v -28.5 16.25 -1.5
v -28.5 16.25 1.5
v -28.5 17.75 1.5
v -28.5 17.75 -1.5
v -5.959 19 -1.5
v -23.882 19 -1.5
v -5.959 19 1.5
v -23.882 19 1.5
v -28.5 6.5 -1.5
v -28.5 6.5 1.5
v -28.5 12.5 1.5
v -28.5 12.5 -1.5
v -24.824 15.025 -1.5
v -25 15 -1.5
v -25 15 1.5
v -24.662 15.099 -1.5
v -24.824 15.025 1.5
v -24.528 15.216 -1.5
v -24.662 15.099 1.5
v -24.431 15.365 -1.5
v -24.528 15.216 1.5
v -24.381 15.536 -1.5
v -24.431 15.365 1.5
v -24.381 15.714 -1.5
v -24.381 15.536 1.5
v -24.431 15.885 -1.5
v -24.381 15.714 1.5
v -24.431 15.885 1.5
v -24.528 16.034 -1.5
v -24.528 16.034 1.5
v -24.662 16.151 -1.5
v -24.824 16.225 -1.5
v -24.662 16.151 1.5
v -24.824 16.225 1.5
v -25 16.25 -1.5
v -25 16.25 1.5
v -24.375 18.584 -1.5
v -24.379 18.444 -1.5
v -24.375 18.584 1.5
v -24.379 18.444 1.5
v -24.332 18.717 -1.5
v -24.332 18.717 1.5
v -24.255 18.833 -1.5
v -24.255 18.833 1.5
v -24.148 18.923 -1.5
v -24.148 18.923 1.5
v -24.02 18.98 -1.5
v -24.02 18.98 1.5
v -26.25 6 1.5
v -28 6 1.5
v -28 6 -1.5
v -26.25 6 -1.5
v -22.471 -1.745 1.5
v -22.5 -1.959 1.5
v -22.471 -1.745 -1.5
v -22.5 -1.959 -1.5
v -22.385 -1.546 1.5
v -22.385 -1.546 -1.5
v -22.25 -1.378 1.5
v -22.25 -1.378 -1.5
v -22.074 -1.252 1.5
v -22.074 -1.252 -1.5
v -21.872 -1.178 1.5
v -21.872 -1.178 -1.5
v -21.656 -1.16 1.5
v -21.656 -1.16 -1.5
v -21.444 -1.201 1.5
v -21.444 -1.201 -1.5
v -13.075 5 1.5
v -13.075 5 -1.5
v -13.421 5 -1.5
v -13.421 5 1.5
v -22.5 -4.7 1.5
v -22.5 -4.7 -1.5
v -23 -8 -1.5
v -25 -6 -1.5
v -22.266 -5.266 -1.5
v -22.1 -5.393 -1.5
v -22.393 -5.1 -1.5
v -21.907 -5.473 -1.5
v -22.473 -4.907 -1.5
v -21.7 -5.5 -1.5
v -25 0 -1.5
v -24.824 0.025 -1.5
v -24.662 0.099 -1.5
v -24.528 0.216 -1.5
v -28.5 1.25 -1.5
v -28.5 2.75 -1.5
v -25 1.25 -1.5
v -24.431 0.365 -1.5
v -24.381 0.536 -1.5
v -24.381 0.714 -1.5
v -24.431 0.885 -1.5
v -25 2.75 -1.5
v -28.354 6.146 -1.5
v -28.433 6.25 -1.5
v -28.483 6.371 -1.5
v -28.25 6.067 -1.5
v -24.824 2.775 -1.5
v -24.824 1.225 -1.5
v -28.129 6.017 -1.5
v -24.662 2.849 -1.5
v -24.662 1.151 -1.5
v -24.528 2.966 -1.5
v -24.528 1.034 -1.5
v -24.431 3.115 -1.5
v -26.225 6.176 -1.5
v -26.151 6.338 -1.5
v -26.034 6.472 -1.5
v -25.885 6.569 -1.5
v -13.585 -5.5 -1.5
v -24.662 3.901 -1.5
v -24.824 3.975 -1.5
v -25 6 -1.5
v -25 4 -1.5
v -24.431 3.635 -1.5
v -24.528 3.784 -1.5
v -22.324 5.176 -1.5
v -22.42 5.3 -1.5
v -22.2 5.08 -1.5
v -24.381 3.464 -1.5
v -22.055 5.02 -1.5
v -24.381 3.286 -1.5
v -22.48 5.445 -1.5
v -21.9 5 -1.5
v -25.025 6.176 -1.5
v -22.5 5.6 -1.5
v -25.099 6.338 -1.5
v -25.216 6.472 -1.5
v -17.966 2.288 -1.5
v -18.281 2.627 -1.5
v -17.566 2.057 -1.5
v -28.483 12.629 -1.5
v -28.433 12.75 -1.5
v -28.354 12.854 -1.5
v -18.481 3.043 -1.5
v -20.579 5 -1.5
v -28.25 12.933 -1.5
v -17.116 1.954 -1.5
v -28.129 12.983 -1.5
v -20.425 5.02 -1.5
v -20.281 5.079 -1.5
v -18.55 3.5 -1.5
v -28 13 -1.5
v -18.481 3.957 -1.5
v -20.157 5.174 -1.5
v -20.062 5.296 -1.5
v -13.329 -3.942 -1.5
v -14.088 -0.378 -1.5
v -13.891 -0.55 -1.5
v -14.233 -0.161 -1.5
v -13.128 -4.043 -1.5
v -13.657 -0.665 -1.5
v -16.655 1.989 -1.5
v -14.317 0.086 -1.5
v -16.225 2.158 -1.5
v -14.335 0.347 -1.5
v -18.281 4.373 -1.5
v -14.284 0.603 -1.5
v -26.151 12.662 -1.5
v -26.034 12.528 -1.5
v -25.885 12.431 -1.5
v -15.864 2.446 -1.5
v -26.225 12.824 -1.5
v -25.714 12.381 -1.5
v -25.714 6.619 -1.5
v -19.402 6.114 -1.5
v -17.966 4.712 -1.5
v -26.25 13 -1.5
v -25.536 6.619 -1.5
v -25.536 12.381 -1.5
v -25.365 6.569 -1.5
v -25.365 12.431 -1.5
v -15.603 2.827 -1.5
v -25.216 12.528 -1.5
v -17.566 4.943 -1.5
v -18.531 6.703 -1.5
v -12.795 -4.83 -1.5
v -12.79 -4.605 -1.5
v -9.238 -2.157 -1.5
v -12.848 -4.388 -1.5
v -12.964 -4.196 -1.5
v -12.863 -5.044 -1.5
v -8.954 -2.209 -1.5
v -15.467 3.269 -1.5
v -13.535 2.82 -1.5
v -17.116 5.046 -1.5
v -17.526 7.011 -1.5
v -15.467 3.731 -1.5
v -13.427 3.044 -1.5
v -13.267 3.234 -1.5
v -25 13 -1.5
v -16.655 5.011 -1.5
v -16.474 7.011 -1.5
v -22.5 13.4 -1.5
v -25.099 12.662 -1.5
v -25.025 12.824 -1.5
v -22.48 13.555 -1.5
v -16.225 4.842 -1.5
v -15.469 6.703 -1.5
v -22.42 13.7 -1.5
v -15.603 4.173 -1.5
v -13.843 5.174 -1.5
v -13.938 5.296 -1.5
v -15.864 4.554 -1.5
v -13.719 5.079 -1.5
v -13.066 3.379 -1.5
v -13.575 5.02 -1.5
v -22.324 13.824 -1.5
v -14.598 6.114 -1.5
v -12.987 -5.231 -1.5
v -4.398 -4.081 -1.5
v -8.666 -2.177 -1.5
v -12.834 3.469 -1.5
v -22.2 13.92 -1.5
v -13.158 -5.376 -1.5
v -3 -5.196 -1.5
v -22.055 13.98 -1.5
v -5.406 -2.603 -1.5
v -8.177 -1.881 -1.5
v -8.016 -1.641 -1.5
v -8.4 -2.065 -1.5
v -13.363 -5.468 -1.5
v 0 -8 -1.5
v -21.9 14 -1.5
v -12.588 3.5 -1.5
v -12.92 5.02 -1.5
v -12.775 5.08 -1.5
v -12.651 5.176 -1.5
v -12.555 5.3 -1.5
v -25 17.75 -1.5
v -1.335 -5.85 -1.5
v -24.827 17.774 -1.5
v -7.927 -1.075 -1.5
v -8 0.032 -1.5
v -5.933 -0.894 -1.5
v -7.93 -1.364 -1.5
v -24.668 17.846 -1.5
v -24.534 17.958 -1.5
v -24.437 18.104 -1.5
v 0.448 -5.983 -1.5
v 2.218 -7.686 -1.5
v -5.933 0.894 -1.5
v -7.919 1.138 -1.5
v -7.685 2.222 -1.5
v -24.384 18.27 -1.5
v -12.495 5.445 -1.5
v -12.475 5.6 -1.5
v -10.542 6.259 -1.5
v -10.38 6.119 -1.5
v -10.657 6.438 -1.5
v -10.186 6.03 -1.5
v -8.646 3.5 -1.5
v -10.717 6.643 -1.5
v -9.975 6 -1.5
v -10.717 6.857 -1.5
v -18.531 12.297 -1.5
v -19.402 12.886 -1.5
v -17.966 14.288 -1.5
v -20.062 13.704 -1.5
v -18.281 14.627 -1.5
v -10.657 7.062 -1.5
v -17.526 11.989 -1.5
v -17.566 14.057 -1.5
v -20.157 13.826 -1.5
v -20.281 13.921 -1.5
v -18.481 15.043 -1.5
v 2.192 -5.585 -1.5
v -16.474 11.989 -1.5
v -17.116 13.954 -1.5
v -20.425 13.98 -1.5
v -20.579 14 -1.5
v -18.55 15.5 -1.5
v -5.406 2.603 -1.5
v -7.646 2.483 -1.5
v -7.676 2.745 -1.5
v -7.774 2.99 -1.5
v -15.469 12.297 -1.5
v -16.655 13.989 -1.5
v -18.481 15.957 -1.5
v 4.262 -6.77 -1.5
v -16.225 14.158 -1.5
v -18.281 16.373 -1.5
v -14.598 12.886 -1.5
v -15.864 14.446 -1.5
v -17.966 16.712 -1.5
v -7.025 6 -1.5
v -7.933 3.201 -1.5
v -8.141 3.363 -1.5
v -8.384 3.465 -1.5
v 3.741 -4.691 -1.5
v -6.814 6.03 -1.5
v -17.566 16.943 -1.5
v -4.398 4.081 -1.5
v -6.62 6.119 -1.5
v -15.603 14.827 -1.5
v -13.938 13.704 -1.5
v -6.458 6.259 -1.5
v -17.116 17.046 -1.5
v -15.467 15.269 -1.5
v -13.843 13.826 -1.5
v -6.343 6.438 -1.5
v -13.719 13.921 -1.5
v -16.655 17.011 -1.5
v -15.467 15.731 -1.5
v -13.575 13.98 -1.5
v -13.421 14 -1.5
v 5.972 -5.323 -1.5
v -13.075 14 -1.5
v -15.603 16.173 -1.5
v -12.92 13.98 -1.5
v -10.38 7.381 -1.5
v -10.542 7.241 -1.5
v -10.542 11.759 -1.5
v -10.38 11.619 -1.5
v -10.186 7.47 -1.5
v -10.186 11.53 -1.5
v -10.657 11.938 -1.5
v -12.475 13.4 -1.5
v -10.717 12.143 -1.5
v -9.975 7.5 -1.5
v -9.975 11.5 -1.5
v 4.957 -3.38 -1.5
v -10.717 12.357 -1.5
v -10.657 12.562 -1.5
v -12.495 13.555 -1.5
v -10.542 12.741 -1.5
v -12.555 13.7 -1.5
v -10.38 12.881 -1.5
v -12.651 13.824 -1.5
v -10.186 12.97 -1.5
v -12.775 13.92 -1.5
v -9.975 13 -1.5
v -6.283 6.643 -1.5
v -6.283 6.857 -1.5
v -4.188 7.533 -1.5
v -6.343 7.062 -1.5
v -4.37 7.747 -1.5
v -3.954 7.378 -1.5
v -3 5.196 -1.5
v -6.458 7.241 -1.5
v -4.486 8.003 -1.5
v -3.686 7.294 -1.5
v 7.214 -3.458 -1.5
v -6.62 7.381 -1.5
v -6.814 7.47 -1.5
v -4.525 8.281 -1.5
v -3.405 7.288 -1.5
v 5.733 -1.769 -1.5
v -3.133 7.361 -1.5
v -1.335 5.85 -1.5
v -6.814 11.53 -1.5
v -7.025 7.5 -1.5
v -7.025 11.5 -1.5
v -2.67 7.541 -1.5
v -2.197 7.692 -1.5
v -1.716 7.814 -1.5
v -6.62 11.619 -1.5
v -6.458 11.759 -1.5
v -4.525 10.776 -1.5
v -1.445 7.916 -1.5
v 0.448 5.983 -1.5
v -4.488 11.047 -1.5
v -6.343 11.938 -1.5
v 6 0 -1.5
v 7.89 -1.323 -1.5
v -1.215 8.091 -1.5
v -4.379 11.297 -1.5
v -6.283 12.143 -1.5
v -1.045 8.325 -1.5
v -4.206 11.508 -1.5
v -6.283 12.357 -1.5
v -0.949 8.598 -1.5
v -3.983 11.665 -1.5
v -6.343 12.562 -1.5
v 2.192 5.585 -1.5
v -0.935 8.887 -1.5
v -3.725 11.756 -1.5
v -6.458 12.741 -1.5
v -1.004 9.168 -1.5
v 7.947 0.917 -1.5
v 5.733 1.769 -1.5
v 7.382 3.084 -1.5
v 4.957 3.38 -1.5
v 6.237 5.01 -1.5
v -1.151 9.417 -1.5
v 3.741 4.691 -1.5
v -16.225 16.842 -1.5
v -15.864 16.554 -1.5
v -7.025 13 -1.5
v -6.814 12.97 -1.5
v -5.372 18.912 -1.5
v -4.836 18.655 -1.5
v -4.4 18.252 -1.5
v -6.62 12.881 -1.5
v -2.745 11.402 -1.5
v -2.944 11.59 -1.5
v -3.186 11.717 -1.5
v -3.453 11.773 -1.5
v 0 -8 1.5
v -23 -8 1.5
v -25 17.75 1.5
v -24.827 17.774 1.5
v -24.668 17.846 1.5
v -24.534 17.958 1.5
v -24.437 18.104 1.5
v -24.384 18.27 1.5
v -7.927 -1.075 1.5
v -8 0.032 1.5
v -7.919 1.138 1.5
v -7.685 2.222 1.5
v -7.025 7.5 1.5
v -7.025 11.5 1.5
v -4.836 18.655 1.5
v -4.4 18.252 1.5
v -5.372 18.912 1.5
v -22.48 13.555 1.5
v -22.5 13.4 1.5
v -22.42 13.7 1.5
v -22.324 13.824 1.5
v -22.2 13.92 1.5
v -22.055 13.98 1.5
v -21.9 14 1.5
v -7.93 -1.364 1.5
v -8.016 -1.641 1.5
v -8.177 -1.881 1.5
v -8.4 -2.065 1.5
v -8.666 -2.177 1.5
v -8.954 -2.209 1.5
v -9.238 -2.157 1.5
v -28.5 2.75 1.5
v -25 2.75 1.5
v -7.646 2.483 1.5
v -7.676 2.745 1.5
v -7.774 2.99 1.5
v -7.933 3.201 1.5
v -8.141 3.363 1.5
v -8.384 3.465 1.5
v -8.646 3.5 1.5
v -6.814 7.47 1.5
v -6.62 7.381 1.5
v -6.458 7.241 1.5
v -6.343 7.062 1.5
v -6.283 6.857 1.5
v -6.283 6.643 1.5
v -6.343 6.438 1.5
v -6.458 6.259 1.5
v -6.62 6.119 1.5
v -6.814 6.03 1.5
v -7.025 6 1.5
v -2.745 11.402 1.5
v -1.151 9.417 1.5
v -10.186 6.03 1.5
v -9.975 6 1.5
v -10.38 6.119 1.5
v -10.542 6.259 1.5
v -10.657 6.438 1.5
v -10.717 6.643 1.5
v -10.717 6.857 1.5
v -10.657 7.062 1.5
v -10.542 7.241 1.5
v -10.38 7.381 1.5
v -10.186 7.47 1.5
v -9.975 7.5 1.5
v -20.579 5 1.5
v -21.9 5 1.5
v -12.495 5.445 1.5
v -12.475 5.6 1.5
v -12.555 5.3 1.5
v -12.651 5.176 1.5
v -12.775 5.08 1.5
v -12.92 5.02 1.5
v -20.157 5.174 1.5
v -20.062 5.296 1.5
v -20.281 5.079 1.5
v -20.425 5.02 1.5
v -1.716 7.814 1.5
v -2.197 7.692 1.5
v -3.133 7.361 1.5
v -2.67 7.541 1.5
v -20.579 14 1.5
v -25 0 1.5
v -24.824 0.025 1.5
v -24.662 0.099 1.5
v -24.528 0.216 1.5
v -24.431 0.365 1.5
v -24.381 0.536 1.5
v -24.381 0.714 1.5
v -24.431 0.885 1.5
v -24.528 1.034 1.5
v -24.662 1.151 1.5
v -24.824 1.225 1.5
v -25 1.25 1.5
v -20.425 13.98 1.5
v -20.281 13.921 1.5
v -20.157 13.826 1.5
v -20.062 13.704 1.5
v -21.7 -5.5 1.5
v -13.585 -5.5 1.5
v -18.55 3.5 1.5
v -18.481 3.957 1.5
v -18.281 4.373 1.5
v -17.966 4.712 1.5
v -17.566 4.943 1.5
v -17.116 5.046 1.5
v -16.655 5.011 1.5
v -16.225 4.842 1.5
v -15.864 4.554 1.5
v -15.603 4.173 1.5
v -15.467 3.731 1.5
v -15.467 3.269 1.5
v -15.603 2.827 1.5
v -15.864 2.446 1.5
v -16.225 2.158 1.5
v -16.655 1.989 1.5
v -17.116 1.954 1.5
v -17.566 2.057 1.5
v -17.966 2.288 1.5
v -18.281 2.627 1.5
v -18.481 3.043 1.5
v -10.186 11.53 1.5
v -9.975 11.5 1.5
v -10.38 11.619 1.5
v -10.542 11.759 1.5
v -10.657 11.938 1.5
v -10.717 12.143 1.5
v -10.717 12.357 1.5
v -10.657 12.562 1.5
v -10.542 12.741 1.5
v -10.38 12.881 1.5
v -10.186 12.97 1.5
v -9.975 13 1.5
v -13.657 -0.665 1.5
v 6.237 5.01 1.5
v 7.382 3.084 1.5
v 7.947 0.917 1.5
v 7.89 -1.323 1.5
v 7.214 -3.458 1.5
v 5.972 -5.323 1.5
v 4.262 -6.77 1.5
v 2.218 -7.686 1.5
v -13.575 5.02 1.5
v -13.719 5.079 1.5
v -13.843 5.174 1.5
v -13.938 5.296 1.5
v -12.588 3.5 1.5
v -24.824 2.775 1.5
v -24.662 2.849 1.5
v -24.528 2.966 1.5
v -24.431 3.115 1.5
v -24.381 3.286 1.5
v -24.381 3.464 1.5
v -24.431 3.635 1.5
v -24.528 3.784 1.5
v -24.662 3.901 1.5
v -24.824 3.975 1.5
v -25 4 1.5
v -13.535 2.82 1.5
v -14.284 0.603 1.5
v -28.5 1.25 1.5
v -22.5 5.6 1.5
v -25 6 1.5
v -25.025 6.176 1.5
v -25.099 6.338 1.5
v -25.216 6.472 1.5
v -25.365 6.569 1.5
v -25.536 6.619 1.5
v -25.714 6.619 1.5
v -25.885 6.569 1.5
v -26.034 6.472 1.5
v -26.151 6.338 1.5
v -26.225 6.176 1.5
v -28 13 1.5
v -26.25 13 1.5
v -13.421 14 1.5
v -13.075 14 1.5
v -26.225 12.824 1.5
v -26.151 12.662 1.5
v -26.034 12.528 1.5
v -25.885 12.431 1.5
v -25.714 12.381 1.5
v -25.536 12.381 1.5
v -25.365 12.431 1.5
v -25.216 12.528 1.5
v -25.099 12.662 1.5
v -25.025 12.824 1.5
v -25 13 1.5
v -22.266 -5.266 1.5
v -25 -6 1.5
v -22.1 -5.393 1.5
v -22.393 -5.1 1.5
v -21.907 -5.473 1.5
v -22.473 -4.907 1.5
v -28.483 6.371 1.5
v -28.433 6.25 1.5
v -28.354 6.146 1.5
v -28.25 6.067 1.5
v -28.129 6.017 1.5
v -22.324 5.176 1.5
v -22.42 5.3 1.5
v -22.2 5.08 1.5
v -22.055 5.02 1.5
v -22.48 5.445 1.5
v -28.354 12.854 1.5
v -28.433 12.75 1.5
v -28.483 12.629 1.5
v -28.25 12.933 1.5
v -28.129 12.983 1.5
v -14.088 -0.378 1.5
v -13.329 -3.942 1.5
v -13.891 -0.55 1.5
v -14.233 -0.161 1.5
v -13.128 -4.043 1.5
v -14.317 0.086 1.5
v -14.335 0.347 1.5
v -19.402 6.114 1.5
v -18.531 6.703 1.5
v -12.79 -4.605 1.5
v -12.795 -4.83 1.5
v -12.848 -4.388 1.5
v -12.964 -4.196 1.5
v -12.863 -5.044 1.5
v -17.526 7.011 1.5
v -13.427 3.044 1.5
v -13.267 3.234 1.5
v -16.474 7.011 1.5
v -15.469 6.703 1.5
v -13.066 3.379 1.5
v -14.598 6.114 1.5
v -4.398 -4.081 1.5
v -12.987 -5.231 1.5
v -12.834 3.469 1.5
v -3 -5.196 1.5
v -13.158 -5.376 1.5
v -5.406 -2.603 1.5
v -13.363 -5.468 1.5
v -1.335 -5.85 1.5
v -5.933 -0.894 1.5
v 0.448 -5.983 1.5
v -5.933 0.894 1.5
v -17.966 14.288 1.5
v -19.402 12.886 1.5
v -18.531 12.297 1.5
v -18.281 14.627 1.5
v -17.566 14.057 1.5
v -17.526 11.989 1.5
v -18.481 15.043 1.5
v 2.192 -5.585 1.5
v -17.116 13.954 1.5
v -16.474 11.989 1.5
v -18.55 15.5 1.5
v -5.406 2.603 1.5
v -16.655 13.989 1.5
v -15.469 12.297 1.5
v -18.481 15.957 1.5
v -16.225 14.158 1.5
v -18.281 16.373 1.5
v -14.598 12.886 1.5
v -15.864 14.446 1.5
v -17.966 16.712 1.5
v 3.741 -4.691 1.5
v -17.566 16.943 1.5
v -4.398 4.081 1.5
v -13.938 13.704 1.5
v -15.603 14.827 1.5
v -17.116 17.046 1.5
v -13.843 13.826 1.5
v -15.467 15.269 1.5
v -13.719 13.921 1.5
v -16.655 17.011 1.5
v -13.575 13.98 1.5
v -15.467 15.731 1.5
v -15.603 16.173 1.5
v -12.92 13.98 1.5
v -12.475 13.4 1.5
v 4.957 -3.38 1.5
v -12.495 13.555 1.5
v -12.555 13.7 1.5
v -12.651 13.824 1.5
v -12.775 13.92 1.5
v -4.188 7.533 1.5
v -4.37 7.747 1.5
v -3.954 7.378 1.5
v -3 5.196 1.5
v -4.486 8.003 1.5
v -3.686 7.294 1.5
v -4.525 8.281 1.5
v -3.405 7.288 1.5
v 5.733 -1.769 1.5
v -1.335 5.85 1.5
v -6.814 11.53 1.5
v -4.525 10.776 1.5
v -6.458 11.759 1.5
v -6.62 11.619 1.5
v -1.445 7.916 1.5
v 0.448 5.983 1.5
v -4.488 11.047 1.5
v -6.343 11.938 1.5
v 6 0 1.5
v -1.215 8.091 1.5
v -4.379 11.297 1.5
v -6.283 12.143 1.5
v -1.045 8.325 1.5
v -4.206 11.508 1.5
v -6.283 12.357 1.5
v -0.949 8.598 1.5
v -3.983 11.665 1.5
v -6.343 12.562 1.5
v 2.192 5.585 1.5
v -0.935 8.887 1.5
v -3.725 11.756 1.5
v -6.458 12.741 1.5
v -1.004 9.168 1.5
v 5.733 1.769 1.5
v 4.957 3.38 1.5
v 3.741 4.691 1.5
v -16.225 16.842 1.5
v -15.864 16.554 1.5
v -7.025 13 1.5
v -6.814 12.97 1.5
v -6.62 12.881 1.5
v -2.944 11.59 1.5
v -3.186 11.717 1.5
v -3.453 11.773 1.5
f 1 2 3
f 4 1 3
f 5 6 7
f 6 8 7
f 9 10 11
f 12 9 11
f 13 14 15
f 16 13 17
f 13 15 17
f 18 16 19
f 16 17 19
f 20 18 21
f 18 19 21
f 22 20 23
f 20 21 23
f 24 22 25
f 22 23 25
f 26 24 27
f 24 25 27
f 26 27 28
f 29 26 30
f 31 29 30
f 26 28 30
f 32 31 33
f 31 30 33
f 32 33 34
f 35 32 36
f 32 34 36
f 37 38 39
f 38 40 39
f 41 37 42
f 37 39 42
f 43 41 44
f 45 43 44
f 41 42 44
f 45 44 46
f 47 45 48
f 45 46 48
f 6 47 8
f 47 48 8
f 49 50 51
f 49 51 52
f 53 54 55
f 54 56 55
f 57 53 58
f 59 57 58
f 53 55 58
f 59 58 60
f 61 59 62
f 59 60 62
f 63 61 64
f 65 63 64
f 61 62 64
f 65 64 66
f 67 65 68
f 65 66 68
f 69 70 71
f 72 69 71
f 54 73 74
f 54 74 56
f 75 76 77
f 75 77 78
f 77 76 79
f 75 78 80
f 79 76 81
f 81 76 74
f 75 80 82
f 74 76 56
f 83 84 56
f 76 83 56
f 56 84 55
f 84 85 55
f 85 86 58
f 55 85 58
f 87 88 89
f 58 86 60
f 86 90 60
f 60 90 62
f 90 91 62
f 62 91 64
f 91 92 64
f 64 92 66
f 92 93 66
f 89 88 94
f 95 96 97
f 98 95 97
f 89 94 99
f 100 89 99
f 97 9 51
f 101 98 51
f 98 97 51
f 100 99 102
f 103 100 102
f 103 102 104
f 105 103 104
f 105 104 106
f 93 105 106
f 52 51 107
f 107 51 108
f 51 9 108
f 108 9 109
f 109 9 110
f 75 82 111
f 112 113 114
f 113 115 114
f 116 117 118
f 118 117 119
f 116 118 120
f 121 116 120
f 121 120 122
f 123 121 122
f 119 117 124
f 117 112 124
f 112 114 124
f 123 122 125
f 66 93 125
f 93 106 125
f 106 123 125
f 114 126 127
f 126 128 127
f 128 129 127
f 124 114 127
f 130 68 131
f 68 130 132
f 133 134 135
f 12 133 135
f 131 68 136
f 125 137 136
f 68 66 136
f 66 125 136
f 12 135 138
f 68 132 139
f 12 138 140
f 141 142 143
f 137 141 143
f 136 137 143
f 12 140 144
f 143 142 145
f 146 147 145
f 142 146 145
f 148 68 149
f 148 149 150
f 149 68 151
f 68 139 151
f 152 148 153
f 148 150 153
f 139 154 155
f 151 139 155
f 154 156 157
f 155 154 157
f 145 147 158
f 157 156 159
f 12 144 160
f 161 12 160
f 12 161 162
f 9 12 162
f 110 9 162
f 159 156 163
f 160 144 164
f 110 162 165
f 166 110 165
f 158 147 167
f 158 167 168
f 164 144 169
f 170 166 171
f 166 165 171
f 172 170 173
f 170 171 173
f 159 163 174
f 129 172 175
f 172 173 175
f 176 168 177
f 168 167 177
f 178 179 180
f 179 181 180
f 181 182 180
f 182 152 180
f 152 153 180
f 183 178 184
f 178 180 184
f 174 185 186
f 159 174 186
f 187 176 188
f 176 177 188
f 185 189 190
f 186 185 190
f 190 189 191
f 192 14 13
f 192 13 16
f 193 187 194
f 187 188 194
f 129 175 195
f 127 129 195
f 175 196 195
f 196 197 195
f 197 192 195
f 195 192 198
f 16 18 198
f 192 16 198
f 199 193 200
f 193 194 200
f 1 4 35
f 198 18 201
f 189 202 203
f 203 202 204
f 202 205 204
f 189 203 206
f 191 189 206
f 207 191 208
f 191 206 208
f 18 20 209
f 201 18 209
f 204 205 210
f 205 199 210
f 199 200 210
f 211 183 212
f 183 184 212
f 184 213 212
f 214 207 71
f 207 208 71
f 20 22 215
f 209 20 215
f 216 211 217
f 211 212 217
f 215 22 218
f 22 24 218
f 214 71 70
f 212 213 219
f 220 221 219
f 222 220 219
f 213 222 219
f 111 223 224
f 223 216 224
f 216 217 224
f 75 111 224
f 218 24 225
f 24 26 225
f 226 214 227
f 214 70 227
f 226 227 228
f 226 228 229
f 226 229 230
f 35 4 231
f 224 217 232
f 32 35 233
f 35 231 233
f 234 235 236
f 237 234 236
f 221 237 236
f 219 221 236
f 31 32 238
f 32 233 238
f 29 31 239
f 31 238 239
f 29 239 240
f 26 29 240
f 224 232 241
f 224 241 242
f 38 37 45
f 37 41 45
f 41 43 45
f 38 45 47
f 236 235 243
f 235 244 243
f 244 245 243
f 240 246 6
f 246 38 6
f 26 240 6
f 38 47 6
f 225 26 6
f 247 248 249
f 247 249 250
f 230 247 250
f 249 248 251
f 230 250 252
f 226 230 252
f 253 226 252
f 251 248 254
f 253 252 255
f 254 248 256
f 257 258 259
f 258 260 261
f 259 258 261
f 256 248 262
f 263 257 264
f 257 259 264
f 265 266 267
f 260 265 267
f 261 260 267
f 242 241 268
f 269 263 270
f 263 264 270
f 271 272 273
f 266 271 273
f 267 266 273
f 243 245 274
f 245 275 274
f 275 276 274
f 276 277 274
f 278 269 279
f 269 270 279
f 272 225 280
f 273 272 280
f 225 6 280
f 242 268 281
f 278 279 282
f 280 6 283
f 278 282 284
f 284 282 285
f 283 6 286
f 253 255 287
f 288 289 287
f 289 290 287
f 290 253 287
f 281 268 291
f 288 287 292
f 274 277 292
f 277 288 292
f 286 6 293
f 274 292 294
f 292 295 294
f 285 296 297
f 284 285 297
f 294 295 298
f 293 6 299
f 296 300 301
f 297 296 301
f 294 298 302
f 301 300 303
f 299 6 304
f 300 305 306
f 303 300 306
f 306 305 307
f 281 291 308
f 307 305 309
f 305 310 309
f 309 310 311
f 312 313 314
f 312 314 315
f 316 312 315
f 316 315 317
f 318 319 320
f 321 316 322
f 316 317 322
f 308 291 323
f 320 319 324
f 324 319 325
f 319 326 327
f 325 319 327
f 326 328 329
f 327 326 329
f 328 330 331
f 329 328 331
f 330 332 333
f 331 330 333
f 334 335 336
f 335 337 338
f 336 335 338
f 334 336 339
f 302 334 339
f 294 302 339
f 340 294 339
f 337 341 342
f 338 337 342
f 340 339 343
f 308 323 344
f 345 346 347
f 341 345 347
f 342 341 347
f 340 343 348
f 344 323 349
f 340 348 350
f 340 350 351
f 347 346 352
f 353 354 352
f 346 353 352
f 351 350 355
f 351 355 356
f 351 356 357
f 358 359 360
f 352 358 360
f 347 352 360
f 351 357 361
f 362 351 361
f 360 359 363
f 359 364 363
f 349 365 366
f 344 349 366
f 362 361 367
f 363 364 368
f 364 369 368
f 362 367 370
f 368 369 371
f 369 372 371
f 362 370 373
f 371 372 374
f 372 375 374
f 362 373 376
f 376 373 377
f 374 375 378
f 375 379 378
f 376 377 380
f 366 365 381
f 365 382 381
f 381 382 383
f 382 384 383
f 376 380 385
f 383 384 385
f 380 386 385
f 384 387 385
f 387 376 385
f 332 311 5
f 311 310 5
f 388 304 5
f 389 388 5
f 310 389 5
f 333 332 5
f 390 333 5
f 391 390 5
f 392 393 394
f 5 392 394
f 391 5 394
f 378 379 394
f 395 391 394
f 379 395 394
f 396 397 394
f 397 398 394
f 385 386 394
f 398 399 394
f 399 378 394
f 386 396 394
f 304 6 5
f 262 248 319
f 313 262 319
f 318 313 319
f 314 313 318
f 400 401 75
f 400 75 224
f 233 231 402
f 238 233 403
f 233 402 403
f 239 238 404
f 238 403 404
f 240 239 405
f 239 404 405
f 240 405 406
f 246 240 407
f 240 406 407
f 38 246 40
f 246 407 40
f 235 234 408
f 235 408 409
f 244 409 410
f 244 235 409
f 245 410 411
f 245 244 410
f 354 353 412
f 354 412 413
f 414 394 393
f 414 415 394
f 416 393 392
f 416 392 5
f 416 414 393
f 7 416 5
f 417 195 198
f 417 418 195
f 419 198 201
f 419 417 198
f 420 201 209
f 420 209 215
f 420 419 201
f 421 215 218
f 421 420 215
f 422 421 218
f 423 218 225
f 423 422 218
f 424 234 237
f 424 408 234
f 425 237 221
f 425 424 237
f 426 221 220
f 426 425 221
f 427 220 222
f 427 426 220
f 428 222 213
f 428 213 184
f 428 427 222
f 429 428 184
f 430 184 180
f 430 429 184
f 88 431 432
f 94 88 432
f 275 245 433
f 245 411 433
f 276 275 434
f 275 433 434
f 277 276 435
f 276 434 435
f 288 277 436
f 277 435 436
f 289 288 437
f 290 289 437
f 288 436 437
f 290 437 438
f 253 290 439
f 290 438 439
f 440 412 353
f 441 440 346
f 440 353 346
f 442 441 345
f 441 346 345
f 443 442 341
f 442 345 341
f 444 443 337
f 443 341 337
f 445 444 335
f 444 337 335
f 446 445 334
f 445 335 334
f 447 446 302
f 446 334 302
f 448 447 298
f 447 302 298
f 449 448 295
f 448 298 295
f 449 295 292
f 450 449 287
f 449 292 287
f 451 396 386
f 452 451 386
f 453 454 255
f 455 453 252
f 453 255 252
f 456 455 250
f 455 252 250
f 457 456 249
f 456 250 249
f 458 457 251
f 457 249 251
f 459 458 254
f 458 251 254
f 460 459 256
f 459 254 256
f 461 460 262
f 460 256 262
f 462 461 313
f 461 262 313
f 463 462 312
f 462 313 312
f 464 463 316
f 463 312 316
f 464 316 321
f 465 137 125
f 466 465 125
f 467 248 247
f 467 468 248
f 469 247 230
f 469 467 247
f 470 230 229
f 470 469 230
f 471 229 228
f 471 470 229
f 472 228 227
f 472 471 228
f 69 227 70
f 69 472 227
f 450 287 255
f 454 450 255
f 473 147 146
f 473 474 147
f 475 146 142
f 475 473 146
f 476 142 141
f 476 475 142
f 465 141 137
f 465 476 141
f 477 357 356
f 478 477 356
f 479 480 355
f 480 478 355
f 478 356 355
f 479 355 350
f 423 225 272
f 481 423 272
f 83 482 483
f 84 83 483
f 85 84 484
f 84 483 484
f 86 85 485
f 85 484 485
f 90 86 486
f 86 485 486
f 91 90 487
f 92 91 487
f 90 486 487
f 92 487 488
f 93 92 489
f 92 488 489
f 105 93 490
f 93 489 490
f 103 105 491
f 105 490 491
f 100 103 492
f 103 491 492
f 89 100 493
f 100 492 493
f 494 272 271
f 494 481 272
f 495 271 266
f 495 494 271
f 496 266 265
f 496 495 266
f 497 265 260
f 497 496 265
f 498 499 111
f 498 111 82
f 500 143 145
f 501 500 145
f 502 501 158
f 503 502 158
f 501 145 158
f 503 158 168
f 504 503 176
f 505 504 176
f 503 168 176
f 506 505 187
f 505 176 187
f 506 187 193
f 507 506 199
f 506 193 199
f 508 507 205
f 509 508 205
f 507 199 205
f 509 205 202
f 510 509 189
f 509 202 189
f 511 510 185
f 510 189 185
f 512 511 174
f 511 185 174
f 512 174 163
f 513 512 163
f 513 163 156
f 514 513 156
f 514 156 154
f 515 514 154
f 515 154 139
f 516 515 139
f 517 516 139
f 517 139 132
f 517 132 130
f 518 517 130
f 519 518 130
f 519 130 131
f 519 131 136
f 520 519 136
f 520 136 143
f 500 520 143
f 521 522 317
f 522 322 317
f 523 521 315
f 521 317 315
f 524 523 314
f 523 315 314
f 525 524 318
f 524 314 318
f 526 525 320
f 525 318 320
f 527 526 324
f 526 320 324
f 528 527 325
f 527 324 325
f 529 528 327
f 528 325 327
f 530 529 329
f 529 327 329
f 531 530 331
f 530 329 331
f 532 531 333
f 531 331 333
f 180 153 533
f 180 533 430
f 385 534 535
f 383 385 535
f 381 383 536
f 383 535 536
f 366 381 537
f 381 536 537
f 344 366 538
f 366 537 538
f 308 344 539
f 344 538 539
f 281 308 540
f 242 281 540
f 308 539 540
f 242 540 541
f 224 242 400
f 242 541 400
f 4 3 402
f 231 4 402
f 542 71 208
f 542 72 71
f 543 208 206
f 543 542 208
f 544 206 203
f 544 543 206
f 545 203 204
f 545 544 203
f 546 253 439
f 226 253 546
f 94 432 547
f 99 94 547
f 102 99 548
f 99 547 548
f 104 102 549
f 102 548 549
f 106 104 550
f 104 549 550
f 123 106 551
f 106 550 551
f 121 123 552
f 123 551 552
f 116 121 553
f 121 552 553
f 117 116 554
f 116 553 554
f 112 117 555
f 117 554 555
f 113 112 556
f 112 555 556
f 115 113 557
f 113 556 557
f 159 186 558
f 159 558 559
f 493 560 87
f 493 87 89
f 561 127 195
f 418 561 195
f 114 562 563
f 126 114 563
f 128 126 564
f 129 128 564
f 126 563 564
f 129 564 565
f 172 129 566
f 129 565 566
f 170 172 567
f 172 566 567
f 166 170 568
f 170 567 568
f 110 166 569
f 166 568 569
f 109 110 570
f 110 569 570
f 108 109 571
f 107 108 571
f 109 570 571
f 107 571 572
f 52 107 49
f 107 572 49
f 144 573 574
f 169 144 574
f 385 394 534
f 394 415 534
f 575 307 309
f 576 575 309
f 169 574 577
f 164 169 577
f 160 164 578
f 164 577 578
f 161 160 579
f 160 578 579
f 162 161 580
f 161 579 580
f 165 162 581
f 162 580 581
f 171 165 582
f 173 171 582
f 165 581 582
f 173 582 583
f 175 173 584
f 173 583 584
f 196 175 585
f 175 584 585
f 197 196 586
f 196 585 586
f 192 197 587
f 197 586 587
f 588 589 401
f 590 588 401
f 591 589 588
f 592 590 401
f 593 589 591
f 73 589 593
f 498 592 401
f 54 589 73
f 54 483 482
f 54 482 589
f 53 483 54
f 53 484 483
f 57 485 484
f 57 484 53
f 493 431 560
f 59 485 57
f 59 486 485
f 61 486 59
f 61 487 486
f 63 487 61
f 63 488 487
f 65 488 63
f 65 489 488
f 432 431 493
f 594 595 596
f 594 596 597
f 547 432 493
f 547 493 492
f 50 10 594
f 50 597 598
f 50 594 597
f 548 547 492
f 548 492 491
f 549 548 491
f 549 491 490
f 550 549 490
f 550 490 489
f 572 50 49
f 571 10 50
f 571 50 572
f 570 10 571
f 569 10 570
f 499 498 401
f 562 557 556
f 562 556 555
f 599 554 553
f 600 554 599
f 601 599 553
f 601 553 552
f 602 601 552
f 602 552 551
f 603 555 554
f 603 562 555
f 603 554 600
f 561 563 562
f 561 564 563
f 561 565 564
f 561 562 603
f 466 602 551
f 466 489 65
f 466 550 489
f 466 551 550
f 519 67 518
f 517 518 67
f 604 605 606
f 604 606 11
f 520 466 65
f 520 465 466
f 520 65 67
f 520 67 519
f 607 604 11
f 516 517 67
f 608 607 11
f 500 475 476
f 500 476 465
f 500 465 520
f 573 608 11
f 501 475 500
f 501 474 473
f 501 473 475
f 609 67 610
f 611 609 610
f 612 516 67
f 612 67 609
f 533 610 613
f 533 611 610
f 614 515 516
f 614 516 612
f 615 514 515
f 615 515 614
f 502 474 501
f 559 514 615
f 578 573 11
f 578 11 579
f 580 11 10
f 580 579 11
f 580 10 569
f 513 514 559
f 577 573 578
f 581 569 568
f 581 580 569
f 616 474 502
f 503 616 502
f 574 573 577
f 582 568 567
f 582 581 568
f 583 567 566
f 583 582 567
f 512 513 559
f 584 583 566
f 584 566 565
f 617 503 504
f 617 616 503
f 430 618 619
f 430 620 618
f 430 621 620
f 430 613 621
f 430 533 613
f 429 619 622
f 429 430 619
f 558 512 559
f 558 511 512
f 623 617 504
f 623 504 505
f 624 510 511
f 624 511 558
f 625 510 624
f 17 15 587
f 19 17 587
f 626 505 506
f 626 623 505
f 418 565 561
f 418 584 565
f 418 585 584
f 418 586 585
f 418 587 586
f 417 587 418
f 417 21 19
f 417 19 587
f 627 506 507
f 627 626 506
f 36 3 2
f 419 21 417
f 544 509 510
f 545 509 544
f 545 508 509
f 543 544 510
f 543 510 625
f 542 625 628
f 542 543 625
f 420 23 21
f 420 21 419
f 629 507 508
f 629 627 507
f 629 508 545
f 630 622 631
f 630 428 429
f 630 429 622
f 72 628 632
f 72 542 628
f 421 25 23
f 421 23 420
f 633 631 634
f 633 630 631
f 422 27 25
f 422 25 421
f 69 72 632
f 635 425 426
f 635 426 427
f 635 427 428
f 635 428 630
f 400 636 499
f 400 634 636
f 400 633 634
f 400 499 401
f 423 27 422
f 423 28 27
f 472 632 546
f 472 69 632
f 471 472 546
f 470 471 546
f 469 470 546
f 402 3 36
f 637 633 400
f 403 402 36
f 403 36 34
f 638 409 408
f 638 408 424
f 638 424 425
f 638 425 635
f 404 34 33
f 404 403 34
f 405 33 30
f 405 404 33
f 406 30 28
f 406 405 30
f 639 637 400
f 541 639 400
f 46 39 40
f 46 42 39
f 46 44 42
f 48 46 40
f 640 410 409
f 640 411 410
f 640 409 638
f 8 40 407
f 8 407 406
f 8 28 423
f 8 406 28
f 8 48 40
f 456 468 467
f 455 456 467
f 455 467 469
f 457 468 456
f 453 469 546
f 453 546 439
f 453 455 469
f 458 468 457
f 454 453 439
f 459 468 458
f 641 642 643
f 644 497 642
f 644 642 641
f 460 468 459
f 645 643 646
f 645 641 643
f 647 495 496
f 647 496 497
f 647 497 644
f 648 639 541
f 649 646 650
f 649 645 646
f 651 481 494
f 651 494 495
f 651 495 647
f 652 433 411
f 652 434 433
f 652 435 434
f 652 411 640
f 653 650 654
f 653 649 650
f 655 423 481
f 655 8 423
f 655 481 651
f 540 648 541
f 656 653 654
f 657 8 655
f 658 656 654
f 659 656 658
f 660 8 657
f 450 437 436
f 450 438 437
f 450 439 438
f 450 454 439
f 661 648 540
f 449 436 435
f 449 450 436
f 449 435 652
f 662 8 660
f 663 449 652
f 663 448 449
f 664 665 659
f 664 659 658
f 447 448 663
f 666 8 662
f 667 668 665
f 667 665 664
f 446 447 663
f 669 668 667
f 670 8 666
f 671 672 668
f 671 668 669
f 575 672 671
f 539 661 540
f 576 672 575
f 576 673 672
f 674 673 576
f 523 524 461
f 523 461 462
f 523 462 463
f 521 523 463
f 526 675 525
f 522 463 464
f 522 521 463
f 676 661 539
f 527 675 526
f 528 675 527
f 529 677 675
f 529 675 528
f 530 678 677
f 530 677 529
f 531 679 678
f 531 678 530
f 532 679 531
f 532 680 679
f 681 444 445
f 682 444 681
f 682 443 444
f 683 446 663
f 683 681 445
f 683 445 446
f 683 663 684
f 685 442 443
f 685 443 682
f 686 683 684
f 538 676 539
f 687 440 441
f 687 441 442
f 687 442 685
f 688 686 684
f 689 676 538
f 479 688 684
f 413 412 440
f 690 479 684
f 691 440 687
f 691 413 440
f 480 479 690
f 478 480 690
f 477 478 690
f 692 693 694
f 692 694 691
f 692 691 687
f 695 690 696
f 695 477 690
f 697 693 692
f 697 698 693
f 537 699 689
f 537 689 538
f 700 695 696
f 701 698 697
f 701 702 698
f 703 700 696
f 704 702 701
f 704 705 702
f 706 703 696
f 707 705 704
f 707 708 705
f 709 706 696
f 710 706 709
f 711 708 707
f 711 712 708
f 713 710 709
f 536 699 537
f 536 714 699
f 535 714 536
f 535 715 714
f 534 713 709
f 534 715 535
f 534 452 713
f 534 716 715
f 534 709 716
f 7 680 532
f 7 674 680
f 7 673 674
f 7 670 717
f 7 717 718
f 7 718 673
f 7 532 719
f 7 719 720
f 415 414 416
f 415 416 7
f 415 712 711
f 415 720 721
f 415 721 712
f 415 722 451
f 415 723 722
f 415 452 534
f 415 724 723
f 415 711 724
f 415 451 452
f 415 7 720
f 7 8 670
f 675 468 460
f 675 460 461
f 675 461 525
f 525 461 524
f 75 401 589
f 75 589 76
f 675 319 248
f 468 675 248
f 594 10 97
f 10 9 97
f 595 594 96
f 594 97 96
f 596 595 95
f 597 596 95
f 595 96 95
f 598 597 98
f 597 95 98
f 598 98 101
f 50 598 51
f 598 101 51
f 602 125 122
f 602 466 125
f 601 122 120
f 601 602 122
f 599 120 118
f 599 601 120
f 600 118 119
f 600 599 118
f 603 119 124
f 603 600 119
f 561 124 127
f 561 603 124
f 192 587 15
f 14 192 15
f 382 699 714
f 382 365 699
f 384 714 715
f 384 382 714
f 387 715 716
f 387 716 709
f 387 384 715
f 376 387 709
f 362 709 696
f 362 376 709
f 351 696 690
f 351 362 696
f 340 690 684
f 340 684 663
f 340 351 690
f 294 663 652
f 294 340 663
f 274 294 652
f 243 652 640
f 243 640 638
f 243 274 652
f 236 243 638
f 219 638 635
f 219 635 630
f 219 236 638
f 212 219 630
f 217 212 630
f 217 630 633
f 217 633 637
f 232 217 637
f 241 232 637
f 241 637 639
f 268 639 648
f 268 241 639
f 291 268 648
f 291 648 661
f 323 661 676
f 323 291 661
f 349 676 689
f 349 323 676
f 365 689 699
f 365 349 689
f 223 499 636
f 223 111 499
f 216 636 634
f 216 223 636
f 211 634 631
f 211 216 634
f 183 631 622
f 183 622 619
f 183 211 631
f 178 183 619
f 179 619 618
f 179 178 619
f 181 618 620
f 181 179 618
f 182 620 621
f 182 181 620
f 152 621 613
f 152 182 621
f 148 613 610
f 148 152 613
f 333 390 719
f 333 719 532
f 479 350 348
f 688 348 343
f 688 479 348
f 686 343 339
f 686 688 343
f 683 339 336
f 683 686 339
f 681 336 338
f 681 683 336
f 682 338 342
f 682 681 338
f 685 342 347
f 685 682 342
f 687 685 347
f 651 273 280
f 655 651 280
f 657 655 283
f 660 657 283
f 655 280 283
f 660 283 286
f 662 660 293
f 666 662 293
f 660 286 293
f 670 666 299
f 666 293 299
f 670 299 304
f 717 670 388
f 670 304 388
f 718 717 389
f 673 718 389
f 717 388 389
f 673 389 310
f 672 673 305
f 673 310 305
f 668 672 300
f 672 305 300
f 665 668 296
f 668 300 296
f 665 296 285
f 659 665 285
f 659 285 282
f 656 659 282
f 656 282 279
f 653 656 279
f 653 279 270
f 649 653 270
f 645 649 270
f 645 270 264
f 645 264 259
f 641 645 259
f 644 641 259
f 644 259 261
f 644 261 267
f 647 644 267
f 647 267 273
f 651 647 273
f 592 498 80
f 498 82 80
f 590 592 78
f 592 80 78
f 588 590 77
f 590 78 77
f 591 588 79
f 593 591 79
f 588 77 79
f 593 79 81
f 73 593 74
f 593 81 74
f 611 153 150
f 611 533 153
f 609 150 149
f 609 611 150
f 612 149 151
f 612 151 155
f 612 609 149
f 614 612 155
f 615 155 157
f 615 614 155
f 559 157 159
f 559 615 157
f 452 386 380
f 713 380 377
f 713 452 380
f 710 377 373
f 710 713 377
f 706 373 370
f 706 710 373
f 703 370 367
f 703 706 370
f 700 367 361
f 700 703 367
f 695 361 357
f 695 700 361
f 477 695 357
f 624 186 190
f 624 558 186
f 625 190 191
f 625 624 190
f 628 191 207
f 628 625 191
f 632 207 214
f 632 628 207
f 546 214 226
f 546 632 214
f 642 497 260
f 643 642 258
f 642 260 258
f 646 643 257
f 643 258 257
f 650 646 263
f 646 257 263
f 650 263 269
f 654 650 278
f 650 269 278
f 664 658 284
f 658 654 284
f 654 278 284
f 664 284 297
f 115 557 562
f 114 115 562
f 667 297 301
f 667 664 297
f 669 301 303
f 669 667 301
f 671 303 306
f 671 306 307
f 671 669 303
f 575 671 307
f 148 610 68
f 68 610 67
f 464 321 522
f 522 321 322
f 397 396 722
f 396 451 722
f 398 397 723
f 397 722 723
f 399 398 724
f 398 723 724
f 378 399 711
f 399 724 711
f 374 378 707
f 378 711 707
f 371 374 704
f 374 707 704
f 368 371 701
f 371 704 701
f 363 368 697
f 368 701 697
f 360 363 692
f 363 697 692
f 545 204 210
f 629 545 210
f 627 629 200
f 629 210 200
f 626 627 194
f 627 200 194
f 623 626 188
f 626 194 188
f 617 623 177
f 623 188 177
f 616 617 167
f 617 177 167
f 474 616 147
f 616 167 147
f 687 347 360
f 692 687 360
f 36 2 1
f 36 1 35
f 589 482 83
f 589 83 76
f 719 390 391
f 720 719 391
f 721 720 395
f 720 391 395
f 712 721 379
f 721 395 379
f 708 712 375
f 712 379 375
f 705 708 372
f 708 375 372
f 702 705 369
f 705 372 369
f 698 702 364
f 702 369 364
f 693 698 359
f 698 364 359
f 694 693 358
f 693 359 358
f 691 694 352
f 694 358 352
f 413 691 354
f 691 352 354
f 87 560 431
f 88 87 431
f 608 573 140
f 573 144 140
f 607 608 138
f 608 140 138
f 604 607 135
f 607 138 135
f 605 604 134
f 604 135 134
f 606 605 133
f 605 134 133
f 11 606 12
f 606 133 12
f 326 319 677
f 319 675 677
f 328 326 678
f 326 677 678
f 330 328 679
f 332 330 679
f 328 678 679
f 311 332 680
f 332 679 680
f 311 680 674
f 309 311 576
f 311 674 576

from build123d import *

# Parameters (mm, degrees)
SKETCH_1_R          = 6
EXTRUDE_1_DEPTH     = 1.5
SKETCH_2_W          = 3.5
SKETCH_2_H          = 7
SKETCH_2_H_2        = 1.5
EXTRUDE_2_DEPTH     = 3
SKETCH_3_R          = 0.625
CUT_EXTRUDE_1_DEPTH = 4
FILLET_1_R          = 0.5
SKETCH_4_R          = 1.55
SKETCH_4_W          = 2.95
SKETCH_4_H          = 7
CUT_EXTRUDE_2_DEPTH = 4
SKETCH_5_R          = 0.75
CUT_EXTRUDE_3_DEPTH = 4
CUT_EXTRUDE_4_DEPTH = 4
FILLET_2_R          = 0.6
CUT_EXTRUDE_5_DEPTH = 4
FILLET_3_R          = 1
EXTRUDE_3_DEPTH     = 3
FILLET_4_R          = 0.8
CHAMFER_1_SIZE      = 2
FILLET_6_R          = 2


with BuildPart() as part:
    # 草图1 → 凸台-拉伸1 (new body, symmetric)
    with BuildSketch(Plane.XY):
        with BuildLine():
            Line((-5, 19), (6.237156693, 5.009778077))
            ThreePointArc((6.237156693, 5.009778077), (6.557579277, -4.582374279), (-2.56, -7.579340341))
            Line((-2.56, -7.579340341), (-25, 0))
            Line((-25, 0), (-25, 19))
            Line((-25, 19), (-5, 19))
        make_face()
        Circle(SKETCH_1_R, mode=Mode.SUBTRACT)
    extrude(amount=EXTRUDE_1_DEPTH, both=True)

    # 草图2 → 凸台-拉伸2 (add)
    with BuildSketch(Plane.XY.offset(1.5)):
        with Locations((-26.75, 9.5)):
            Rectangle(SKETCH_2_W, SKETCH_2_H)
        with Locations((-26.75, 2)):
            Rectangle(SKETCH_2_W, SKETCH_2_H_2)
        with Locations((-26.75, 17)):
            Rectangle(SKETCH_2_W, SKETCH_2_H_2)
    extrude(amount=-EXTRUDE_2_DEPTH)

    # 草图3 → 切除-拉伸1 (cut, through all)
    with BuildSketch(Plane.XY.offset(1.5)):
        with Locations((-25, 15.625)):
            Circle(SKETCH_3_R)
        with Locations((-25, 18.375)):
            Circle(SKETCH_3_R)
        with Locations((-25, 3.375)):
            Circle(SKETCH_3_R)
        with Locations((-25, 0.625)):
            Circle(SKETCH_3_R)
        with Locations((-25.625, 6)):
            Circle(SKETCH_3_R)
        with Locations((-25.625, 13)):
            Circle(SKETCH_3_R)
    extrude(amount=-CUT_EXTRUDE_1_DEPTH, mode=Mode.SUBTRACT)

    # 圆角1
    fillet_1_edges = [part.edges().sort_by_distance(p)[0] for p in [
        (-28.5, 6, 0),
        (-28.5, 13, 0),
        (-25, 19, 0),
    ]]
    fillet(fillet_1_edges, radius=FILLET_1_R)

    # 草图4 → 切除-拉伸2 (cut, through all)
    with BuildSketch(Plane(origin=(0, 0, -1.5), x_dir=(-1, 0, 0), z_dir=(0, 0, -1))):
        with Locations((17, 15.5)):
            Circle(SKETCH_4_R)
        with Locations((17, 3.5)):
            Circle(SKETCH_4_R)
        with Locations((8.5, 9.5)):
            Rectangle(SKETCH_4_W, SKETCH_4_H)
    extrude(amount=-CUT_EXTRUDE_2_DEPTH, mode=Mode.SUBTRACT)

    # 草图5 → 切除-拉伸3 (cut, through all)
    with BuildSketch(Plane(origin=(0, 0, -1.5), x_dir=(-1, 0, 0), z_dir=(0, 0, -1))):
        with Locations((7.025, 12.25)):
            Circle(SKETCH_5_R)
        with Locations((9.975, 12.25)):
            Circle(SKETCH_5_R)
        with Locations((7.025, 6.75)):
            Circle(SKETCH_5_R)
        with Locations((9.975, 6.75)):
            Circle(SKETCH_5_R)
    extrude(amount=-CUT_EXTRUDE_3_DEPTH, mode=Mode.SUBTRACT)

    # 草图6 → 切除-拉伸4 (cut, through all)
    with BuildSketch(Plane(origin=(0, 0, -1.5), x_dir=(-1, 0, 0), z_dir=(0, 0, -1))):
        with BuildLine():
            Line((12.475, 14), (12.475, 5))
            Line((12.475, 5), (13.782469891, 5))
            ThreePointArc((13.782469891, 5), (17, 7.05), (20.217530109, 5))
            Line((20.217530109, 5), (22.5, 5))
            Line((22.5, 5), (22.5, 14))
            Line((22.5, 14), (20.217530109, 14))
            ThreePointArc((20.217530109, 14), (17, 11.95), (13.782469891, 14))
            Line((13.782469891, 14), (12.475, 14))
        make_face()
    extrude(amount=-CUT_EXTRUDE_4_DEPTH, mode=Mode.SUBTRACT)

    # 圆角2
    fillet_2_edges = [part.edges().sort_by_distance(p)[0] for p in [
        (-12.475, 14, 0),
        (-13.782469891, 14, 0),
        (-20.217530109, 14, 0),
        (-22.5, 14, 0),
        (-22.5, 5, 0),
        (-20.217530109, 5, 0),
        (-13.782469891, 5, 0),
        (-12.475, 5, 0),
    ]]
    fillet(fillet_2_edges, radius=FILLET_2_R)

    # 草图7 → 切除-拉伸5 (cut, through all)
    with BuildSketch(Plane(origin=(0, 0, -1.5), x_dir=(-1, 0, 0), z_dir=(0, 0, -1))):
        with BuildLine():
            Line((7.193747285, 3.5), (13.305747104, 3.5))
            Line((13.305747104, 3.5), (14.604346249, -0.344736281))
            Line((14.604346249, -0.344736281), (7.516620657, -2.738688353))
            ThreePointArc((7.516620657, -2.738688353), (7.989307814, 0.413473892), (7.193747285, 3.5))
        make_face()
        with BuildLine():
            Line((4.525, 13.617995246), (0.012533825, 7.999990181))
            ThreePointArc((0.012533825, 7.999990181), (2.374697418, 7.639424859), (4.525, 6.597300584))
            Line((4.525, 6.597300584), (4.525, 13.617995246))
        make_face()
    extrude(amount=-CUT_EXTRUDE_5_DEPTH, mode=Mode.SUBTRACT)

    # 圆角3
    fillet_3_edges = [part.edges().sort_by_distance(p)[0] for p in [
        (-7.516620657, -2.738688353, 0),
        (-7.193747285, 3.5, 0),
        (-13.305747104, 3.5, 0),
        (-14.604346249, -0.344736281, 0),
        (-4.525, 13.617995246, 0),
        (-4.525, 6.597300584, 0),
        (-0.012533825, 7.999990181, 0),
    ]]
    fillet(fillet_3_edges, radius=FILLET_3_R)

    # 草图8 → 凸台-拉伸3 (add)
    with BuildSketch(Plane.XY.offset(1.5)):
        with BuildLine():
            Line((-25, 0), (-25, -8))
            Line((-25, -8), (0, -8))
            ThreePointArc((0, -8), (-1.297165617, -7.894134618), (-2.56, -7.579340341))
            Line((-2.56, -7.579340341), (-8.716260987, -5.5))
            Line((-8.716260987, -5.5), (-22.5, -5.5))
            Line((-22.5, -5.5), (-22.5, -0.844400662))
            Line((-22.5, -0.844400662), (-25, 0))
        make_face()
    extrude(amount=-EXTRUDE_3_DEPTH)

    # 圆角4
    fillet_4_edges = [part.edges().sort_by_distance(p)[0] for p in [
        (-22.5, -0.844400662, 0),
        (-22.5, -5.5, 0),
        (-8.716260987, -5.5, 0),
    ]]
    fillet(fillet_4_edges, radius=FILLET_4_R)

    # 倒角1
    chamfer_1_edges = [part.edges().sort_by_distance(p)[0] for p in [
        (-25, -8, 0),
    ]]
    chamfer(chamfer_1_edges, length=CHAMFER_1_SIZE)

    # 圆角6
    fillet_6_edges = [part.edges().sort_by_distance(p)[0] for p in [
        (-5, 19, 0),
    ]]
    fillet(fillet_6_edges, radius=FILLET_6_R)


solid = part.part
